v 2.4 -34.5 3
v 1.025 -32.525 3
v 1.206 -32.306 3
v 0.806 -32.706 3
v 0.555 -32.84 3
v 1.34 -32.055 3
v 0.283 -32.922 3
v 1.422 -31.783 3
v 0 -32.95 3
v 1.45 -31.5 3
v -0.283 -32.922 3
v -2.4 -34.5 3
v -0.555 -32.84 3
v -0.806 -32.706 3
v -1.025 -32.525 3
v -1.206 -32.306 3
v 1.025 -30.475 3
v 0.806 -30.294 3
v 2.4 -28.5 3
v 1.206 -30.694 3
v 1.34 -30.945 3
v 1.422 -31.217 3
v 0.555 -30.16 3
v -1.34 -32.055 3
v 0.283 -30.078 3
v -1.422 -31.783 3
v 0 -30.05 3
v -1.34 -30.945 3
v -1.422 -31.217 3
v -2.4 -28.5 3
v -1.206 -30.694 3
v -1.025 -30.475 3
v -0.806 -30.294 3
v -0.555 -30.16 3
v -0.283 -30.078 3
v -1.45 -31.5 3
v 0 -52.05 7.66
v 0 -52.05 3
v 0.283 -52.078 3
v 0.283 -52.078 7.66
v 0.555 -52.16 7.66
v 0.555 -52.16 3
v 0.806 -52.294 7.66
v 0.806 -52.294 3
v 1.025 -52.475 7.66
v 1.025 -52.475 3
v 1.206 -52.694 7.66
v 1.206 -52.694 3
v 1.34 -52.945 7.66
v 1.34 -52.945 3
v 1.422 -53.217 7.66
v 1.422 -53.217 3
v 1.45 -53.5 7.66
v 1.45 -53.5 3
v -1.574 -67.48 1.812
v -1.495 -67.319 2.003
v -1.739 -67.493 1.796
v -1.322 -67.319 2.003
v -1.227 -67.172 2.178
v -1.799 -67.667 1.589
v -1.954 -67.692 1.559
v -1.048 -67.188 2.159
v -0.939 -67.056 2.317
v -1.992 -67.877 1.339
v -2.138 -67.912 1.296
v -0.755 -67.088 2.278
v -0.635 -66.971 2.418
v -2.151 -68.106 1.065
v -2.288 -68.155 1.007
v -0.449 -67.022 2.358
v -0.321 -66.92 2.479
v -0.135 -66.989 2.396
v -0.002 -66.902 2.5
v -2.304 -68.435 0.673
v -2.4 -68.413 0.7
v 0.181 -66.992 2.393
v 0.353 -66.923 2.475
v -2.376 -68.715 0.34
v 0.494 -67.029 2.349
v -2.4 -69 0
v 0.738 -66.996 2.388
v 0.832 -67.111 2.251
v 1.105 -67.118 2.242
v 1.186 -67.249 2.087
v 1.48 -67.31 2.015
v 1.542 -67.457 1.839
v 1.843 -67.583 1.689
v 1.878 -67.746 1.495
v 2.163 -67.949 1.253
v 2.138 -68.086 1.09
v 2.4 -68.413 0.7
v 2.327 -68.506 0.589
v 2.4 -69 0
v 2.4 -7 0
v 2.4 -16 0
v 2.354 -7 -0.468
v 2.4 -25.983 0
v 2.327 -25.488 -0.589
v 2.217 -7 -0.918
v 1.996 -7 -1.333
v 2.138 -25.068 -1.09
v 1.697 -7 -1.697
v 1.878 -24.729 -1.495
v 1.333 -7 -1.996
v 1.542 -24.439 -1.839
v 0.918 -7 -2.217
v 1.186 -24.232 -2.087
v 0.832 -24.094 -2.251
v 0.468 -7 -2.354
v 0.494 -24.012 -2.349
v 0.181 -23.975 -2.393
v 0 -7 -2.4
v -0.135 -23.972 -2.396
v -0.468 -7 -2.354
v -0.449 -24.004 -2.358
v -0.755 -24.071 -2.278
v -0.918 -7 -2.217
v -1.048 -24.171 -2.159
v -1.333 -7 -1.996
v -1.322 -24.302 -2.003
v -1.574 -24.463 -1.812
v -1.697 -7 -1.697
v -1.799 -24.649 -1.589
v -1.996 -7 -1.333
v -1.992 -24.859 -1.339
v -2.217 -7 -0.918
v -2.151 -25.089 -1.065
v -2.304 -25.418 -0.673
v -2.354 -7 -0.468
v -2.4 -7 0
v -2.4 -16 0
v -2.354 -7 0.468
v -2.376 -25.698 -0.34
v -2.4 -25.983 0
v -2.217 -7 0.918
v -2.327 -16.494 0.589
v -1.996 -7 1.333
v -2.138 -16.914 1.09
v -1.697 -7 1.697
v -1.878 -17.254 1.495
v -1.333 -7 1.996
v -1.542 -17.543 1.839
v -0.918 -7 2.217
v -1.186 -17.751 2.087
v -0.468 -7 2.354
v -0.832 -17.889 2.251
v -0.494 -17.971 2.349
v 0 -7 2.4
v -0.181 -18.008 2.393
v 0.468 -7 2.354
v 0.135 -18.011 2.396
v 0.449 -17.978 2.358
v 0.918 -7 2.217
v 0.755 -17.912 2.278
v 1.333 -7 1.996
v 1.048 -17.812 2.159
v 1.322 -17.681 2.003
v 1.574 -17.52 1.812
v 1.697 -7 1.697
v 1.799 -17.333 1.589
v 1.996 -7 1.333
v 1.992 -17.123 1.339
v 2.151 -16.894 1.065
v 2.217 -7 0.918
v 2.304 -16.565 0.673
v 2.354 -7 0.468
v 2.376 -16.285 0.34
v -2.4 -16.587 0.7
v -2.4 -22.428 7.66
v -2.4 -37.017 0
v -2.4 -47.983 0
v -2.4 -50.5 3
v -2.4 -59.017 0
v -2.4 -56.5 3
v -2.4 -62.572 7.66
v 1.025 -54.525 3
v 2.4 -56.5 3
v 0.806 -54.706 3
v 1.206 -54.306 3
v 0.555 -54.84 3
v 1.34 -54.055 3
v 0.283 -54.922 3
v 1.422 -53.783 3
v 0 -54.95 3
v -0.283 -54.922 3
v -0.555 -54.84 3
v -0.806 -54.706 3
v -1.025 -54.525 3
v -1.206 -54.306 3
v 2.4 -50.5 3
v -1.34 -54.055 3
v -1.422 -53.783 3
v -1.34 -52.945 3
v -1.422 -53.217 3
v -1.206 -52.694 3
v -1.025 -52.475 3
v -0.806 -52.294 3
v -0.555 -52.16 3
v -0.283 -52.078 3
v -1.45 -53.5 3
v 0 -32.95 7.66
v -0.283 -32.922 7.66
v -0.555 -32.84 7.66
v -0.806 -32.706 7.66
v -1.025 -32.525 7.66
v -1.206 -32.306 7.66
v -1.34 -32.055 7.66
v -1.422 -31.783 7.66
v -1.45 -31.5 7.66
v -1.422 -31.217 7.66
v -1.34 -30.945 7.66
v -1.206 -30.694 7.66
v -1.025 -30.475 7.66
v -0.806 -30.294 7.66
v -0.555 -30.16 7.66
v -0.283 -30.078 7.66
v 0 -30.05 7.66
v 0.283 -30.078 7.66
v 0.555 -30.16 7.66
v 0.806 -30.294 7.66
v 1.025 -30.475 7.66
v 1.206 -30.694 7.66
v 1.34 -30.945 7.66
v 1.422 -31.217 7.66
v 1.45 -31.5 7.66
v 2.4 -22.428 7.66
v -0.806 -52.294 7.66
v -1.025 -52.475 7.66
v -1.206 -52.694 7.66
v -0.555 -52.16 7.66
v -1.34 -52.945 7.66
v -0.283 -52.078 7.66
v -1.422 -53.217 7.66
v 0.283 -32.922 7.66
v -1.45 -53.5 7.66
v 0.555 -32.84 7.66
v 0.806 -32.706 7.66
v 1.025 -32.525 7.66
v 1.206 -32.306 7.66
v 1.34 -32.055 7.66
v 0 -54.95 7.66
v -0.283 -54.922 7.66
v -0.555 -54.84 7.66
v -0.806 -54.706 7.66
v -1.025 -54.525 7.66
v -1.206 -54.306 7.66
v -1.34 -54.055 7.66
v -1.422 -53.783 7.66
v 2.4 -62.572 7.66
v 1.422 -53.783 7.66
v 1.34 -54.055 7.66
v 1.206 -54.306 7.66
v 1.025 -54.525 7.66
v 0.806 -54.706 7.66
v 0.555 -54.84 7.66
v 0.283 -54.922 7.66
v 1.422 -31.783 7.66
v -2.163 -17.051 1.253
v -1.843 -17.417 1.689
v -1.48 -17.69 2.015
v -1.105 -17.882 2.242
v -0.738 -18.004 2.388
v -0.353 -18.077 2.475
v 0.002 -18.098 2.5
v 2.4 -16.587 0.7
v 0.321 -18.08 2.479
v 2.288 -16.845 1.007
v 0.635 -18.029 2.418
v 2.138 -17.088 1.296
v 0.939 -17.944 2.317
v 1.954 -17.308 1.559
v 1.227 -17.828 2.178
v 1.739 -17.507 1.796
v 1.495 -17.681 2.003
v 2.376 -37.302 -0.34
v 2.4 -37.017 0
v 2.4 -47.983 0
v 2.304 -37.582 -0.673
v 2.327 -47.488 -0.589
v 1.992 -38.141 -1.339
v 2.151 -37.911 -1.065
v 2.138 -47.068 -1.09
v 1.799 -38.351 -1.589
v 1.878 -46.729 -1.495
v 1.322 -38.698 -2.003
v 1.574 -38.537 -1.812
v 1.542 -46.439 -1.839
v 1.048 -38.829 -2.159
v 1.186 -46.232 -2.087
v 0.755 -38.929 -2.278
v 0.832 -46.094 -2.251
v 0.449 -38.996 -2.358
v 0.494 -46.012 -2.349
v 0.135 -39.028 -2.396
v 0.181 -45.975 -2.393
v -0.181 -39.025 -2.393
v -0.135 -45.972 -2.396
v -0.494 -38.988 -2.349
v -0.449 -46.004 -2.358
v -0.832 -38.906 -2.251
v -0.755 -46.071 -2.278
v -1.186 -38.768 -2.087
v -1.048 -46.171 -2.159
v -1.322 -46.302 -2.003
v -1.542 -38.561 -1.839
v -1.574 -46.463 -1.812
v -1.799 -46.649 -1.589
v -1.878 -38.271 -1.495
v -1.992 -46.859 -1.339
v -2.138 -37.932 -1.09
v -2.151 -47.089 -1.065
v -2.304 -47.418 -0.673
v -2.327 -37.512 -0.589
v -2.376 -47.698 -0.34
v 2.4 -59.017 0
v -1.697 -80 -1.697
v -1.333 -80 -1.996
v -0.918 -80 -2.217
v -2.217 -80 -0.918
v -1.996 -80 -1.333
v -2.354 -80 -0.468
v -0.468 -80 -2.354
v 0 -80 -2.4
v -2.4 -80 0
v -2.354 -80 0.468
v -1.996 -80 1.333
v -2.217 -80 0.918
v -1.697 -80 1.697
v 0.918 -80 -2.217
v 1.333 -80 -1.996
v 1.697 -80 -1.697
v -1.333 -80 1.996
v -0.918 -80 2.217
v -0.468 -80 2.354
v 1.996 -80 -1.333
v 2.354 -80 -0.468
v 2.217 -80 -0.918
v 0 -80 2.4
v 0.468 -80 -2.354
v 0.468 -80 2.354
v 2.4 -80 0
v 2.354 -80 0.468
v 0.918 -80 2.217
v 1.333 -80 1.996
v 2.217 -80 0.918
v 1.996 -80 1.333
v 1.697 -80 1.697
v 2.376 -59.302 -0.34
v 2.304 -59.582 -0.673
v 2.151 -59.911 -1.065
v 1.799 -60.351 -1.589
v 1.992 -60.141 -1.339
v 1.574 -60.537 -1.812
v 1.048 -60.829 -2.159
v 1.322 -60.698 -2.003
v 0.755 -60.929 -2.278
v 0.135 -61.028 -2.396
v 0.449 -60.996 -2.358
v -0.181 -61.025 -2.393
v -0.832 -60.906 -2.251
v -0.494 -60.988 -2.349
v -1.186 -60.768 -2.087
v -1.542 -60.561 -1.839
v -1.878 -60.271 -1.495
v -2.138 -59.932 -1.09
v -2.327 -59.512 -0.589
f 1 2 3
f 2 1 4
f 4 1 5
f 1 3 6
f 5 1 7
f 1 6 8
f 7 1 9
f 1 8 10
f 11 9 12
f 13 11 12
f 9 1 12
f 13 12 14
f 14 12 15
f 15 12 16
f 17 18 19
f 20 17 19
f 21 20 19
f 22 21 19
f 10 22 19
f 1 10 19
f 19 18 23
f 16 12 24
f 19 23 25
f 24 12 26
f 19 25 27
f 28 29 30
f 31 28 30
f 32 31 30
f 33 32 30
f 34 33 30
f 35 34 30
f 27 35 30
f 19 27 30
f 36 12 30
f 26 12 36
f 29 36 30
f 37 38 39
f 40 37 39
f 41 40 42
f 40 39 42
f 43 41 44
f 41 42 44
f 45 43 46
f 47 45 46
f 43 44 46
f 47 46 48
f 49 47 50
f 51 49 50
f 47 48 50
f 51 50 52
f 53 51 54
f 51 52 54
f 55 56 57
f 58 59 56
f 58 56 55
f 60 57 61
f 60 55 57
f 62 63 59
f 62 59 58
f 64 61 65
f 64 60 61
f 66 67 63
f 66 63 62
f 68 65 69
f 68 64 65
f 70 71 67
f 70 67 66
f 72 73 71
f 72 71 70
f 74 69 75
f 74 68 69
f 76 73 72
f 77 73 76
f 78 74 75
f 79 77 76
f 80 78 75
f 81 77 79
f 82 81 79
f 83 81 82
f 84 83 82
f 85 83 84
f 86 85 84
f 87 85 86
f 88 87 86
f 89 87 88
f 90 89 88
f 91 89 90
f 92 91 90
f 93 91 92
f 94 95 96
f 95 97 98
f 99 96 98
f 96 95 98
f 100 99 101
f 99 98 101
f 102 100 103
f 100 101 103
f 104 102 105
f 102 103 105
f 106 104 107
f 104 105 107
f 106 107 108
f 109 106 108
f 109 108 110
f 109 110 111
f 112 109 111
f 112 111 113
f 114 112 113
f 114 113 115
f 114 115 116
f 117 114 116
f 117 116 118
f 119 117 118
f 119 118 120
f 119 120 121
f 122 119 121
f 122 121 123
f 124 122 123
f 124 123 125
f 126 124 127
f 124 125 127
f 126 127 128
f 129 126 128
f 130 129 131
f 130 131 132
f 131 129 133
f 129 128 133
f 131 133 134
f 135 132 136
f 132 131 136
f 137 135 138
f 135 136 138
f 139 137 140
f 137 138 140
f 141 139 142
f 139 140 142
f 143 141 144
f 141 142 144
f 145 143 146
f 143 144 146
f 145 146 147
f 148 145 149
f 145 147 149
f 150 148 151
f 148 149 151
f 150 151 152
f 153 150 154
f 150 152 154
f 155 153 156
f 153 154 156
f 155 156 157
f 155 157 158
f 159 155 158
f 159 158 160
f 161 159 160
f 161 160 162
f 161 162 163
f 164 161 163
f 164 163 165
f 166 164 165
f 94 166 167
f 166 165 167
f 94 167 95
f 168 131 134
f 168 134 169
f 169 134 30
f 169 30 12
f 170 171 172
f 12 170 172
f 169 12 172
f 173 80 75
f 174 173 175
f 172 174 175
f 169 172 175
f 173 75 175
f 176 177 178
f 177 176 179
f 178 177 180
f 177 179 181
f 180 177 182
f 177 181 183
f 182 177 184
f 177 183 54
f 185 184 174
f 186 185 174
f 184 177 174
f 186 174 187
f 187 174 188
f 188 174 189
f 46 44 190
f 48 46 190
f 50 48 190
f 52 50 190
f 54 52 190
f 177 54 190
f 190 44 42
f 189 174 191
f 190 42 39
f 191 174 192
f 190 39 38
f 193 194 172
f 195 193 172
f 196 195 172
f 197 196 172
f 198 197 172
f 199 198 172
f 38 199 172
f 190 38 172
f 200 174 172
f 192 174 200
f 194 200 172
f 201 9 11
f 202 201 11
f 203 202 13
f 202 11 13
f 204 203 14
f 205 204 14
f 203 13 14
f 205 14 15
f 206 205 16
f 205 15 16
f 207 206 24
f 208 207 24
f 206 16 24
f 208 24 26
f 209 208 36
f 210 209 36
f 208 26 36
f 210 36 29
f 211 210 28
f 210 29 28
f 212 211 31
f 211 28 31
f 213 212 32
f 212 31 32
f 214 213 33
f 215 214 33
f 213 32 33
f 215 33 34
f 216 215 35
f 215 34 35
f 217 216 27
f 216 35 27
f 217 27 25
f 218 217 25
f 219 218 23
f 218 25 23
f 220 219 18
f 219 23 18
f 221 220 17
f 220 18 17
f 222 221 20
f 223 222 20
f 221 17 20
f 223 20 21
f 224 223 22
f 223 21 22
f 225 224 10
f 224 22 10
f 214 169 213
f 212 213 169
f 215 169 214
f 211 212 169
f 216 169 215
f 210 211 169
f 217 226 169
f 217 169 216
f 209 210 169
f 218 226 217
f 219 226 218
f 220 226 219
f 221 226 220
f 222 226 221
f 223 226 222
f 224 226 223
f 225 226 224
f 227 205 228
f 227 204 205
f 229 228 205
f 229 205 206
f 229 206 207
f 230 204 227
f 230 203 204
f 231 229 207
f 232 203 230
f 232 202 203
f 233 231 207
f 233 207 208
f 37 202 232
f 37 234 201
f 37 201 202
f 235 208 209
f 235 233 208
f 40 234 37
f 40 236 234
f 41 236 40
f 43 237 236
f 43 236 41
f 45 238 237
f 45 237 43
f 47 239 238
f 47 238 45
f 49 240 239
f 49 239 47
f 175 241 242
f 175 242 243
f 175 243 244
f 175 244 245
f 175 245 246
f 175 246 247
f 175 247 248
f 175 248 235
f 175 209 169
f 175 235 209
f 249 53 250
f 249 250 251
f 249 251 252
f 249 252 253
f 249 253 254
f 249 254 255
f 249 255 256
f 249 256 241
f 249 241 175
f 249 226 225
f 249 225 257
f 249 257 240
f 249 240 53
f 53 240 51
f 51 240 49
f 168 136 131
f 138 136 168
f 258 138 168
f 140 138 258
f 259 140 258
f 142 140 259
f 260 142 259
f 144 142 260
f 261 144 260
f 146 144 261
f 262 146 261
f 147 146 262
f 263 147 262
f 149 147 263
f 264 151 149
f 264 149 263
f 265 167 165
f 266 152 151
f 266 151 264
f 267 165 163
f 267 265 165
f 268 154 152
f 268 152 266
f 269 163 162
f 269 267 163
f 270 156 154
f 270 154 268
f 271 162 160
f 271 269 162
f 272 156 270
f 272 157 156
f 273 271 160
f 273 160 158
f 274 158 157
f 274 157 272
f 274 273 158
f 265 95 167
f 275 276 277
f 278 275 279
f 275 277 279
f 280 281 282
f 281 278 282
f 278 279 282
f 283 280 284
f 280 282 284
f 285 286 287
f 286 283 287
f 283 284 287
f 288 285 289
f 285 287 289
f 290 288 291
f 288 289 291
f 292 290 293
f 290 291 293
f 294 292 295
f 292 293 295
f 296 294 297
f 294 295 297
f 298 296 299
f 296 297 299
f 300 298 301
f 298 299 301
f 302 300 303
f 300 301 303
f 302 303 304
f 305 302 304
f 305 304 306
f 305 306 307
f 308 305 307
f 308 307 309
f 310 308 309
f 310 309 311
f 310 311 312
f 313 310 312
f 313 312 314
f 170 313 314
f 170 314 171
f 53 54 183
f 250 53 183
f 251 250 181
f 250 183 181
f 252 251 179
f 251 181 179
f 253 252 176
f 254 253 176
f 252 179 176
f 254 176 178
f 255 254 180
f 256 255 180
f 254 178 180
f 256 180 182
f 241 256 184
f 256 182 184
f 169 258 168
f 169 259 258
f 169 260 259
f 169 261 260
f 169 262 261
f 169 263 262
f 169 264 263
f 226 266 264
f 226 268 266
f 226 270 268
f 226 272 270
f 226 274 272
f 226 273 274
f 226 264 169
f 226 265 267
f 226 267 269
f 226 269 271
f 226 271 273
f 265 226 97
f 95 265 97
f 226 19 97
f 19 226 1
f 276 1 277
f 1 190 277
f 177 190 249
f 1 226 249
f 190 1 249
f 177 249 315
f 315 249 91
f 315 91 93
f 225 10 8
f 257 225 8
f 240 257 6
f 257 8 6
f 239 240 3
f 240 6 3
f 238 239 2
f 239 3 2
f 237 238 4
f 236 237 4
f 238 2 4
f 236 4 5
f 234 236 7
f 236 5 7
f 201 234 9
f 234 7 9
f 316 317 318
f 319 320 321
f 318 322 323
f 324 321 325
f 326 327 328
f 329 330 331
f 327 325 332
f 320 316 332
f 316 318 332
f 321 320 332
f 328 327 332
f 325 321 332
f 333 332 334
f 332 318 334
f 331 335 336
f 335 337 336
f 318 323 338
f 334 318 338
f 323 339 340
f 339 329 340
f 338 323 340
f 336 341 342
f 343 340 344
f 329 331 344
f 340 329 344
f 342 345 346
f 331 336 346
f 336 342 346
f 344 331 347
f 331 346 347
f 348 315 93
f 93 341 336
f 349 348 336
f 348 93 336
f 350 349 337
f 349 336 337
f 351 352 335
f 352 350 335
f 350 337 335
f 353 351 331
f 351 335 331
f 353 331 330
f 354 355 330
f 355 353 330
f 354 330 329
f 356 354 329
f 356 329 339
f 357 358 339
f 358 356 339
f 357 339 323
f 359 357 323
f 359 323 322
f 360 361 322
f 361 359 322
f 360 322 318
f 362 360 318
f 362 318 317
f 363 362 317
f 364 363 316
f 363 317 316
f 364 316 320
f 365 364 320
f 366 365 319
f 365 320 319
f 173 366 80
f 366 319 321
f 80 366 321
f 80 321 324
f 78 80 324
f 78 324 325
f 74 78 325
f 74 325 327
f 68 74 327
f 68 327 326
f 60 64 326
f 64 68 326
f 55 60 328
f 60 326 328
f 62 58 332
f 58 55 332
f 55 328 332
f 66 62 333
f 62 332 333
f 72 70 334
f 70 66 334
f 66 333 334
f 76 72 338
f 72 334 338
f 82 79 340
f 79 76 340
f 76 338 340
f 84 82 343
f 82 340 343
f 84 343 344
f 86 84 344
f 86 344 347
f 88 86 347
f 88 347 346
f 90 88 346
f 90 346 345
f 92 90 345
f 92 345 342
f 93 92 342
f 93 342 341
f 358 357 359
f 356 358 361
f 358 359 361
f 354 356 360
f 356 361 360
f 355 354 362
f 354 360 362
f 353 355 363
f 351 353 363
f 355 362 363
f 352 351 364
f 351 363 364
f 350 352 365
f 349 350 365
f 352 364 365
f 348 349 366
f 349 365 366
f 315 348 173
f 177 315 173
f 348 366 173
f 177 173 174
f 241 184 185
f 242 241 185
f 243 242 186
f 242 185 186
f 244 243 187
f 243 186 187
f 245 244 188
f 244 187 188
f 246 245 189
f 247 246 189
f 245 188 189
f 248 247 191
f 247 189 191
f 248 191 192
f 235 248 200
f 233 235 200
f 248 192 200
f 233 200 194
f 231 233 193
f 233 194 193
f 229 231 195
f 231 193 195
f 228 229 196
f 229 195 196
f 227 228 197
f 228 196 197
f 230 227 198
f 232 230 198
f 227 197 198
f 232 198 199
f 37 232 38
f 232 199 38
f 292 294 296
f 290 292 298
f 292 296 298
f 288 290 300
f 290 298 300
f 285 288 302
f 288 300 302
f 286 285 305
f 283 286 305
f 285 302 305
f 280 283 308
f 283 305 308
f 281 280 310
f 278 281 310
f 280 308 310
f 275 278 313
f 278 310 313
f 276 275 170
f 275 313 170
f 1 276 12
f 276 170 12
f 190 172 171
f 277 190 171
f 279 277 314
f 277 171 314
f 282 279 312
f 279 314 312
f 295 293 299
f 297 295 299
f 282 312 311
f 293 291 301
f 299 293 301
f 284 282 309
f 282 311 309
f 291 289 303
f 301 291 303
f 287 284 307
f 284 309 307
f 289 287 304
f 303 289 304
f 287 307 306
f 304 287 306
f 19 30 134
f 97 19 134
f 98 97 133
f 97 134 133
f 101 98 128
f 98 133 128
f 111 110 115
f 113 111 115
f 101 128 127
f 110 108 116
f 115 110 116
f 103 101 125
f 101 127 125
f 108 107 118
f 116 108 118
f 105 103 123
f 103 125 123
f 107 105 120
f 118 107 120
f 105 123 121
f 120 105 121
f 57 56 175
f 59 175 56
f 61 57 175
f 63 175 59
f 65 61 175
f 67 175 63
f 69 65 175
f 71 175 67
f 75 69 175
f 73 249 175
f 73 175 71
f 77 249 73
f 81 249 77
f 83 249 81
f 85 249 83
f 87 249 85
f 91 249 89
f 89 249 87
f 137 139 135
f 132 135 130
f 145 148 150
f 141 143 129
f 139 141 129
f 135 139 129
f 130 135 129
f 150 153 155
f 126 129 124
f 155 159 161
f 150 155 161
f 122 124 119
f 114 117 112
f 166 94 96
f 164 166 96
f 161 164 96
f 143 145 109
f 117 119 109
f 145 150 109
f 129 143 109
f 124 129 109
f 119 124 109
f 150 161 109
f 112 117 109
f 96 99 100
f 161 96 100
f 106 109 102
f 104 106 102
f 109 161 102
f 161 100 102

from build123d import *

# Parameters (mm, degrees)
F0_R      = 2.5
F1_DEPTH  = 85
F3_DEPTH  = 2.5
F5_DEPTH  = 25
F8_DEPTH  = 25
F9_DEPTH  = 25
F11_DEPTH = 25
F14_DEPTH = 102
F16_REACH = 96.5783545855
F18_REACH = 97.7333268634
F19_W     = 5
F19_H     = 41.5
F20_DEPTH = 25


with BuildPart() as f1:
    # F0 (on Front) → F1 (new body)
    with BuildSketch(Plane.XZ):
        Circle(F0_R)
    extrude(amount=F1_DEPTH)

    # F2 (on Right) → F3 (join, symmetric)
    with BuildSketch(Plane.YZ):
        Polygon((-69, 0), (-16, 0), (-22.4278760969, 7.6604444312), (-62.5721239031, 7.6604444312), align=None)
    extrude(amount=F3_DEPTH, both=True)

    # F4 (on face) → F5 (cut)
    with BuildSketch(Plane(origin=(-2.5, 0, 0), x_dir=(0, -1, 0), z_dir=(-1, 0, 0))):
        Polygon((56.5, 3), (53.5, 3), (50.5, 3), (44.1691353238, -4.5448307221), (62.8308646762, -4.5448307221), align=None)
        Polygon((40.8308646762, -4.5448307221), (34.5, 3), (31.5, 3), (28.5, 3), (22.1691353238, -4.5448307221), align=None)
    extrude(amount=-F5_DEPTH, mode=Mode.SUBTRACT)

    # F7 (on face) → F8 (cut)
    with BuildSketch(Plane(origin=(-2.5, 0, 0), x_dir=(0, -1, 0), z_dir=(-1, 0, 0))):
        Polygon((19.9172031134, 7.5), (22.2932472338, 7.5), (22.4278760969, 7.6604444312), (62.5721239031, 7.6604444312), (62.7067527662, 7.5), (66.5233954787, 7.5), (66.5233954787, 10.3880958632), (19.9172031134, 10.3880958632), align=None)
    extrude(amount=-F8_DEPTH, mode=Mode.SUBTRACT)

    # F6 (on face) → F9 (cut)
    with BuildSketch(Plane(origin=(0, 0, 3), x_dir=(1, 0, 0), z_dir=(0, 0, -1))):
        with BuildLine():
            ThreePointArc((1.45, 53.5), (1.0253048327, 54.5253048327), (0, 54.95))
            Line((0, 54.95), (0, 52.05))
            ThreePointArc((0, 52.05), (1.0253048327, 52.4746951673), (1.45, 53.5))
        make_face()
        with BuildLine():
            Line((0, 52.05), (0, 54.95))
            ThreePointArc((0, 54.95), (-1.45, 53.5), (0, 52.05))
        make_face()
    extrude(amount=-F9_DEPTH, mode=Mode.SUBTRACT)

    # F10 (on face) → F11 (cut)
    with BuildSketch(Plane(origin=(0, 0, 3), x_dir=(1, 0, 0), z_dir=(0, 0, -1))):
        with BuildLine():
            ThreePointArc((1.45, 31.5), (1.0253048327, 32.5253048327), (0, 32.95))
            Line((0, 32.95), (0, 30.05))
            ThreePointArc((0, 30.05), (1.0253048327, 30.4746951673), (1.45, 31.5))
        make_face()
        with BuildLine():
            Line((0, 30.05), (0, 32.95))
            ThreePointArc((0, 32.95), (-1.45, 31.5), (0, 30.05))
        make_face()
    extrude(amount=-F11_DEPTH, mode=Mode.SUBTRACT)

    # F13 (on face) → F14 (cut)
    with BuildSketch(Plane.XZ.offset(85)):
        with BuildLine():
            ThreePointArc((2.4, 0), (0, -2.4), (-2.4, 0))
            Line((-2.4, 0), (-2.4, 9.7710704431))
            Line((-2.4, 9.7710704431), (-6.1972029507, 9.7710704431))
            Line((-6.1972029507, 9.7710704431), (-6.1972029507, -5.7614380494))
            Line((-6.1972029507, -5.7614380494), (5.5722752586, -5.7614380494))
            Line((5.5722752586, -5.7614380494), (5.5722752586, 8.8547384366))
            Line((5.5722752586, 8.8547384366), (2.4, 9.1607915238))
            Line((2.4, 9.1607915238), (2.4, 0))
        make_face()
    extrude(amount=-F14_DEPTH, mode=Mode.SUBTRACT)

    f16_end = Plane(origin=(0, -64.9529870595, 4.8230422111), x_dir=(0, -0.6427876097, -0.7660444431), z_dir=(0, -0.7660444431, 0.6427876097))
    # F15 (on face) → F16 (cut, up to a plane its end follows)
    with BuildSketch(Plane.XZ.offset(85)):
        with BuildLine():
            ThreePointArc((-2.4, 0), (0, 2.4), (2.4, 0))
            Line((2.4, 0), (4.8319334164, 0))
            Line((4.8319334164, 0), (4.1808704846, 8.0774491653))
            Line((4.1808704846, 8.0774491653), (-2.9383567162, 8.0774491653))
            Line((-2.9383567162, 8.0774491653), (-3.4620375372, 0))
            Line((-3.4620375372, 0), (-2.4, 0))
        make_face()
    f16_long = extrude(amount=-F16_REACH, mode=Mode.PRIVATE)
    add(split(f16_long, bisect_by=f16_end, keep=Keep.TOP, mode=Mode.PRIVATE), mode=Mode.SUBTRACT)

    f18_end = Plane(origin=(0, -20.0470129405, 4.8230422111), x_dir=(0, -0.6427876097, 0.7660444431), z_dir=(0, 0.7660444431, 0.6427876097))
    # F17 (on face) → F18 (cut, up to a plane its end follows)
    with BuildSketch(Plane(origin=(0, 0, 0), x_dir=(-1, 0, 0), z_dir=(0, 1, 0))):
        with BuildLine():
            ThreePointArc((-2.4, 0), (0, 2.4), (2.4, 0))
            Line((2.4, 0), (3.9089121856, 0))
            Line((3.9089121856, 0), (4.3247276917, 8.6870230734))
            Line((4.3247276917, 8.6870230734), (-4.9837511033, 8.3660408854))
            Line((-4.9837511033, 8.3660408854), (-3.4170385916, 0))
            Line((-3.4170385916, 0), (-2.4, 0))
        make_face()
    f18_long = extrude(amount=-F18_REACH, mode=Mode.PRIVATE)
    add(split(f18_long, bisect_by=f18_end, keep=Keep.TOP, mode=Mode.PRIVATE), mode=Mode.SUBTRACT)

    # F19 (on face) → F20 (cut)
    with BuildSketch(Plane.YZ.offset(2.4)):
        Polygon((0, -4.5159468427), (0, -2.4), (0, 2.4), (-7, 2.4), (-7, -4.5159468427), align=None)
        with Locations((-82.5, 0)):
            Rectangle(F19_W, F19_H)
    extrude(amount=-F20_DEPTH, mode=Mode.SUBTRACT)


solid = f1.part
